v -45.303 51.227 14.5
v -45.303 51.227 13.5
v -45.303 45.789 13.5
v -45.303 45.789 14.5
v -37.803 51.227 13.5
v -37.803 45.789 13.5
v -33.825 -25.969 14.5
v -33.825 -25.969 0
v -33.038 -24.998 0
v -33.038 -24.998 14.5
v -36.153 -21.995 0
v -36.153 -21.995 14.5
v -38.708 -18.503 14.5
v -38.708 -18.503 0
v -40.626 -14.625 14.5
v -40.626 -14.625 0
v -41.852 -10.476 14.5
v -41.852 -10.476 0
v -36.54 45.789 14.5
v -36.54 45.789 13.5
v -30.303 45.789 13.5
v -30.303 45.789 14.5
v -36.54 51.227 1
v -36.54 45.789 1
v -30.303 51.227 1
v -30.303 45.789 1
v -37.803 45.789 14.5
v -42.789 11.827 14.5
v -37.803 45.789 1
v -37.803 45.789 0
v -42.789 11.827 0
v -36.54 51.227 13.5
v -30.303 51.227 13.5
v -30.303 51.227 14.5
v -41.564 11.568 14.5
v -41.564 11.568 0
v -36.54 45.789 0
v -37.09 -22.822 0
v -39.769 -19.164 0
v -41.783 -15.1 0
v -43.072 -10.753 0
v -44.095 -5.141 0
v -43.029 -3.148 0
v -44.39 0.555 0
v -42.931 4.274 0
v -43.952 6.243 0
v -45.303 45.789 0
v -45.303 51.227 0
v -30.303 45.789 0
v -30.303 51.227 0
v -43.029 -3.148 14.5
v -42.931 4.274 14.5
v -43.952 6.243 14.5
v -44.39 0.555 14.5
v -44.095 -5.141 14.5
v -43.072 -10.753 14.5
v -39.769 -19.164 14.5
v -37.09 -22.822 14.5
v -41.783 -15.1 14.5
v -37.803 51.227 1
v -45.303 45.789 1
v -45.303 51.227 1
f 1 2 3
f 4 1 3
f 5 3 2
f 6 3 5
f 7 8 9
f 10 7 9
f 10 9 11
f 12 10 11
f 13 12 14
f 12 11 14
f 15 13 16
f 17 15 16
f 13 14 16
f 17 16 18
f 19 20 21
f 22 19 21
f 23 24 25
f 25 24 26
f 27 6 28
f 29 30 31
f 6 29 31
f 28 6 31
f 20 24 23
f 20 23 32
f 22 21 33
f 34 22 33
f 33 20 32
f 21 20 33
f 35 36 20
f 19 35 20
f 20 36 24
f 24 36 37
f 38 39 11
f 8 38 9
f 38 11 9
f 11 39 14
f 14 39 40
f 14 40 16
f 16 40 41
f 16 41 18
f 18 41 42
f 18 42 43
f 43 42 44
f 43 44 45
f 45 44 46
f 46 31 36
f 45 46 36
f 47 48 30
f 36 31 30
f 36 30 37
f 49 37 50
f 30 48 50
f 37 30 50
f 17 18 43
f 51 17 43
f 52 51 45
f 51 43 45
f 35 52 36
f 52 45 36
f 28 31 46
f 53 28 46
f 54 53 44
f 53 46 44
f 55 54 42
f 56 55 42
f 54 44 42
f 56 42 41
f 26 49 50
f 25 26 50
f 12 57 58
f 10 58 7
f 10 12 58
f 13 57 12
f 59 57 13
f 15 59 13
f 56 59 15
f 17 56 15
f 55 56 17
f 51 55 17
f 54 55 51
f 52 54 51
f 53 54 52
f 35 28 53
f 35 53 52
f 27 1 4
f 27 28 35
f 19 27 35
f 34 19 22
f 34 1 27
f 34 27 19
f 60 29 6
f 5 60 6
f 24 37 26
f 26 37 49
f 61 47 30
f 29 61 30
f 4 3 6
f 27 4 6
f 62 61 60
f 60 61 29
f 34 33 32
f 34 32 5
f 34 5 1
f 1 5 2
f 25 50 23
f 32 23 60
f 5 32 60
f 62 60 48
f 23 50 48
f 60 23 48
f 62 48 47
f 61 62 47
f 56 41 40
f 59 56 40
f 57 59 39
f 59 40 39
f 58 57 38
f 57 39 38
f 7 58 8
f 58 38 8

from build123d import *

# Parameters (mm, degrees)
EXTRUDE_1_DEPTH     = 14.5
SKETCH_3_W          = 7.5
SKETCH_3_H          = 12.5
CUT_EXTRUDE_1_DEPTH = 14.5
SKETCH_4_W          = 6.236601739
SKETCH_4_H          = 12.5
CUT_EXTRUDE_2_DEPTH = 14.5


with BuildPart() as part:
    # 草图2 → 凸台-拉伸1 (new body)
    with BuildSketch(Plane.XY):
        Polygon((-37.803253111, 45.788749387), (-30.303253111, 45.788749387), (-30.303253111, 46.246753013), (-30.303253111, 51.227331274), (-45.303253111, 51.227331274), (-45.303253111, 45.788749387), align=None)
        with BuildLine():
            Line((-36.53985485, 45.788749387), (-37.803253111, 45.788749387))
            Line((-37.803253111, 45.788749387), (-42.78903224, 11.827146721))
            ThreePointArc((-42.78903224, 11.827146721), (-44.390022844, 0.555474177), (-43.071585345, -10.752730607))
            ThreePointArc((-43.071585345, -10.752730607), (-39.768948275, -19.163531384), (-33.824827731, -25.969147616))
            Line((-33.824827731, -25.969147616), (-33.037880544, -24.9979555))
            ThreePointArc((-33.037880544, -24.9979555), (-38.707558344, -18.503127277), (-41.852353206, -10.475779938))
            ThreePointArc((-41.852353206, -10.475779938), (-43.139798164, 0.565020843), (-41.563632025, 11.568315655))
            Line((-41.563632025, 11.568315655), (-36.53985485, 45.788749387))
        make_face()
    extrude(amount=EXTRUDE_1_DEPTH)

    # 草图3 → 切除-拉伸1 (cut)
    with BuildSketch(Plane.XZ.offset(-45.788749387)):
        with Locations((-41.553253111, 7.25)):
            Rectangle(SKETCH_3_W, SKETCH_3_H)
    extrude(amount=-CUT_EXTRUDE_1_DEPTH, mode=Mode.SUBTRACT)

    # 草图4 → 切除-拉伸2 (cut)
    with BuildSketch(Plane.XZ.offset(-45.788749387)):
        with Locations((-33.421553981, 7.25)):
            Rectangle(SKETCH_4_W, SKETCH_4_H)
    extrude(amount=-CUT_EXTRUDE_2_DEPTH, mode=Mode.SUBTRACT)


solid = part.part
